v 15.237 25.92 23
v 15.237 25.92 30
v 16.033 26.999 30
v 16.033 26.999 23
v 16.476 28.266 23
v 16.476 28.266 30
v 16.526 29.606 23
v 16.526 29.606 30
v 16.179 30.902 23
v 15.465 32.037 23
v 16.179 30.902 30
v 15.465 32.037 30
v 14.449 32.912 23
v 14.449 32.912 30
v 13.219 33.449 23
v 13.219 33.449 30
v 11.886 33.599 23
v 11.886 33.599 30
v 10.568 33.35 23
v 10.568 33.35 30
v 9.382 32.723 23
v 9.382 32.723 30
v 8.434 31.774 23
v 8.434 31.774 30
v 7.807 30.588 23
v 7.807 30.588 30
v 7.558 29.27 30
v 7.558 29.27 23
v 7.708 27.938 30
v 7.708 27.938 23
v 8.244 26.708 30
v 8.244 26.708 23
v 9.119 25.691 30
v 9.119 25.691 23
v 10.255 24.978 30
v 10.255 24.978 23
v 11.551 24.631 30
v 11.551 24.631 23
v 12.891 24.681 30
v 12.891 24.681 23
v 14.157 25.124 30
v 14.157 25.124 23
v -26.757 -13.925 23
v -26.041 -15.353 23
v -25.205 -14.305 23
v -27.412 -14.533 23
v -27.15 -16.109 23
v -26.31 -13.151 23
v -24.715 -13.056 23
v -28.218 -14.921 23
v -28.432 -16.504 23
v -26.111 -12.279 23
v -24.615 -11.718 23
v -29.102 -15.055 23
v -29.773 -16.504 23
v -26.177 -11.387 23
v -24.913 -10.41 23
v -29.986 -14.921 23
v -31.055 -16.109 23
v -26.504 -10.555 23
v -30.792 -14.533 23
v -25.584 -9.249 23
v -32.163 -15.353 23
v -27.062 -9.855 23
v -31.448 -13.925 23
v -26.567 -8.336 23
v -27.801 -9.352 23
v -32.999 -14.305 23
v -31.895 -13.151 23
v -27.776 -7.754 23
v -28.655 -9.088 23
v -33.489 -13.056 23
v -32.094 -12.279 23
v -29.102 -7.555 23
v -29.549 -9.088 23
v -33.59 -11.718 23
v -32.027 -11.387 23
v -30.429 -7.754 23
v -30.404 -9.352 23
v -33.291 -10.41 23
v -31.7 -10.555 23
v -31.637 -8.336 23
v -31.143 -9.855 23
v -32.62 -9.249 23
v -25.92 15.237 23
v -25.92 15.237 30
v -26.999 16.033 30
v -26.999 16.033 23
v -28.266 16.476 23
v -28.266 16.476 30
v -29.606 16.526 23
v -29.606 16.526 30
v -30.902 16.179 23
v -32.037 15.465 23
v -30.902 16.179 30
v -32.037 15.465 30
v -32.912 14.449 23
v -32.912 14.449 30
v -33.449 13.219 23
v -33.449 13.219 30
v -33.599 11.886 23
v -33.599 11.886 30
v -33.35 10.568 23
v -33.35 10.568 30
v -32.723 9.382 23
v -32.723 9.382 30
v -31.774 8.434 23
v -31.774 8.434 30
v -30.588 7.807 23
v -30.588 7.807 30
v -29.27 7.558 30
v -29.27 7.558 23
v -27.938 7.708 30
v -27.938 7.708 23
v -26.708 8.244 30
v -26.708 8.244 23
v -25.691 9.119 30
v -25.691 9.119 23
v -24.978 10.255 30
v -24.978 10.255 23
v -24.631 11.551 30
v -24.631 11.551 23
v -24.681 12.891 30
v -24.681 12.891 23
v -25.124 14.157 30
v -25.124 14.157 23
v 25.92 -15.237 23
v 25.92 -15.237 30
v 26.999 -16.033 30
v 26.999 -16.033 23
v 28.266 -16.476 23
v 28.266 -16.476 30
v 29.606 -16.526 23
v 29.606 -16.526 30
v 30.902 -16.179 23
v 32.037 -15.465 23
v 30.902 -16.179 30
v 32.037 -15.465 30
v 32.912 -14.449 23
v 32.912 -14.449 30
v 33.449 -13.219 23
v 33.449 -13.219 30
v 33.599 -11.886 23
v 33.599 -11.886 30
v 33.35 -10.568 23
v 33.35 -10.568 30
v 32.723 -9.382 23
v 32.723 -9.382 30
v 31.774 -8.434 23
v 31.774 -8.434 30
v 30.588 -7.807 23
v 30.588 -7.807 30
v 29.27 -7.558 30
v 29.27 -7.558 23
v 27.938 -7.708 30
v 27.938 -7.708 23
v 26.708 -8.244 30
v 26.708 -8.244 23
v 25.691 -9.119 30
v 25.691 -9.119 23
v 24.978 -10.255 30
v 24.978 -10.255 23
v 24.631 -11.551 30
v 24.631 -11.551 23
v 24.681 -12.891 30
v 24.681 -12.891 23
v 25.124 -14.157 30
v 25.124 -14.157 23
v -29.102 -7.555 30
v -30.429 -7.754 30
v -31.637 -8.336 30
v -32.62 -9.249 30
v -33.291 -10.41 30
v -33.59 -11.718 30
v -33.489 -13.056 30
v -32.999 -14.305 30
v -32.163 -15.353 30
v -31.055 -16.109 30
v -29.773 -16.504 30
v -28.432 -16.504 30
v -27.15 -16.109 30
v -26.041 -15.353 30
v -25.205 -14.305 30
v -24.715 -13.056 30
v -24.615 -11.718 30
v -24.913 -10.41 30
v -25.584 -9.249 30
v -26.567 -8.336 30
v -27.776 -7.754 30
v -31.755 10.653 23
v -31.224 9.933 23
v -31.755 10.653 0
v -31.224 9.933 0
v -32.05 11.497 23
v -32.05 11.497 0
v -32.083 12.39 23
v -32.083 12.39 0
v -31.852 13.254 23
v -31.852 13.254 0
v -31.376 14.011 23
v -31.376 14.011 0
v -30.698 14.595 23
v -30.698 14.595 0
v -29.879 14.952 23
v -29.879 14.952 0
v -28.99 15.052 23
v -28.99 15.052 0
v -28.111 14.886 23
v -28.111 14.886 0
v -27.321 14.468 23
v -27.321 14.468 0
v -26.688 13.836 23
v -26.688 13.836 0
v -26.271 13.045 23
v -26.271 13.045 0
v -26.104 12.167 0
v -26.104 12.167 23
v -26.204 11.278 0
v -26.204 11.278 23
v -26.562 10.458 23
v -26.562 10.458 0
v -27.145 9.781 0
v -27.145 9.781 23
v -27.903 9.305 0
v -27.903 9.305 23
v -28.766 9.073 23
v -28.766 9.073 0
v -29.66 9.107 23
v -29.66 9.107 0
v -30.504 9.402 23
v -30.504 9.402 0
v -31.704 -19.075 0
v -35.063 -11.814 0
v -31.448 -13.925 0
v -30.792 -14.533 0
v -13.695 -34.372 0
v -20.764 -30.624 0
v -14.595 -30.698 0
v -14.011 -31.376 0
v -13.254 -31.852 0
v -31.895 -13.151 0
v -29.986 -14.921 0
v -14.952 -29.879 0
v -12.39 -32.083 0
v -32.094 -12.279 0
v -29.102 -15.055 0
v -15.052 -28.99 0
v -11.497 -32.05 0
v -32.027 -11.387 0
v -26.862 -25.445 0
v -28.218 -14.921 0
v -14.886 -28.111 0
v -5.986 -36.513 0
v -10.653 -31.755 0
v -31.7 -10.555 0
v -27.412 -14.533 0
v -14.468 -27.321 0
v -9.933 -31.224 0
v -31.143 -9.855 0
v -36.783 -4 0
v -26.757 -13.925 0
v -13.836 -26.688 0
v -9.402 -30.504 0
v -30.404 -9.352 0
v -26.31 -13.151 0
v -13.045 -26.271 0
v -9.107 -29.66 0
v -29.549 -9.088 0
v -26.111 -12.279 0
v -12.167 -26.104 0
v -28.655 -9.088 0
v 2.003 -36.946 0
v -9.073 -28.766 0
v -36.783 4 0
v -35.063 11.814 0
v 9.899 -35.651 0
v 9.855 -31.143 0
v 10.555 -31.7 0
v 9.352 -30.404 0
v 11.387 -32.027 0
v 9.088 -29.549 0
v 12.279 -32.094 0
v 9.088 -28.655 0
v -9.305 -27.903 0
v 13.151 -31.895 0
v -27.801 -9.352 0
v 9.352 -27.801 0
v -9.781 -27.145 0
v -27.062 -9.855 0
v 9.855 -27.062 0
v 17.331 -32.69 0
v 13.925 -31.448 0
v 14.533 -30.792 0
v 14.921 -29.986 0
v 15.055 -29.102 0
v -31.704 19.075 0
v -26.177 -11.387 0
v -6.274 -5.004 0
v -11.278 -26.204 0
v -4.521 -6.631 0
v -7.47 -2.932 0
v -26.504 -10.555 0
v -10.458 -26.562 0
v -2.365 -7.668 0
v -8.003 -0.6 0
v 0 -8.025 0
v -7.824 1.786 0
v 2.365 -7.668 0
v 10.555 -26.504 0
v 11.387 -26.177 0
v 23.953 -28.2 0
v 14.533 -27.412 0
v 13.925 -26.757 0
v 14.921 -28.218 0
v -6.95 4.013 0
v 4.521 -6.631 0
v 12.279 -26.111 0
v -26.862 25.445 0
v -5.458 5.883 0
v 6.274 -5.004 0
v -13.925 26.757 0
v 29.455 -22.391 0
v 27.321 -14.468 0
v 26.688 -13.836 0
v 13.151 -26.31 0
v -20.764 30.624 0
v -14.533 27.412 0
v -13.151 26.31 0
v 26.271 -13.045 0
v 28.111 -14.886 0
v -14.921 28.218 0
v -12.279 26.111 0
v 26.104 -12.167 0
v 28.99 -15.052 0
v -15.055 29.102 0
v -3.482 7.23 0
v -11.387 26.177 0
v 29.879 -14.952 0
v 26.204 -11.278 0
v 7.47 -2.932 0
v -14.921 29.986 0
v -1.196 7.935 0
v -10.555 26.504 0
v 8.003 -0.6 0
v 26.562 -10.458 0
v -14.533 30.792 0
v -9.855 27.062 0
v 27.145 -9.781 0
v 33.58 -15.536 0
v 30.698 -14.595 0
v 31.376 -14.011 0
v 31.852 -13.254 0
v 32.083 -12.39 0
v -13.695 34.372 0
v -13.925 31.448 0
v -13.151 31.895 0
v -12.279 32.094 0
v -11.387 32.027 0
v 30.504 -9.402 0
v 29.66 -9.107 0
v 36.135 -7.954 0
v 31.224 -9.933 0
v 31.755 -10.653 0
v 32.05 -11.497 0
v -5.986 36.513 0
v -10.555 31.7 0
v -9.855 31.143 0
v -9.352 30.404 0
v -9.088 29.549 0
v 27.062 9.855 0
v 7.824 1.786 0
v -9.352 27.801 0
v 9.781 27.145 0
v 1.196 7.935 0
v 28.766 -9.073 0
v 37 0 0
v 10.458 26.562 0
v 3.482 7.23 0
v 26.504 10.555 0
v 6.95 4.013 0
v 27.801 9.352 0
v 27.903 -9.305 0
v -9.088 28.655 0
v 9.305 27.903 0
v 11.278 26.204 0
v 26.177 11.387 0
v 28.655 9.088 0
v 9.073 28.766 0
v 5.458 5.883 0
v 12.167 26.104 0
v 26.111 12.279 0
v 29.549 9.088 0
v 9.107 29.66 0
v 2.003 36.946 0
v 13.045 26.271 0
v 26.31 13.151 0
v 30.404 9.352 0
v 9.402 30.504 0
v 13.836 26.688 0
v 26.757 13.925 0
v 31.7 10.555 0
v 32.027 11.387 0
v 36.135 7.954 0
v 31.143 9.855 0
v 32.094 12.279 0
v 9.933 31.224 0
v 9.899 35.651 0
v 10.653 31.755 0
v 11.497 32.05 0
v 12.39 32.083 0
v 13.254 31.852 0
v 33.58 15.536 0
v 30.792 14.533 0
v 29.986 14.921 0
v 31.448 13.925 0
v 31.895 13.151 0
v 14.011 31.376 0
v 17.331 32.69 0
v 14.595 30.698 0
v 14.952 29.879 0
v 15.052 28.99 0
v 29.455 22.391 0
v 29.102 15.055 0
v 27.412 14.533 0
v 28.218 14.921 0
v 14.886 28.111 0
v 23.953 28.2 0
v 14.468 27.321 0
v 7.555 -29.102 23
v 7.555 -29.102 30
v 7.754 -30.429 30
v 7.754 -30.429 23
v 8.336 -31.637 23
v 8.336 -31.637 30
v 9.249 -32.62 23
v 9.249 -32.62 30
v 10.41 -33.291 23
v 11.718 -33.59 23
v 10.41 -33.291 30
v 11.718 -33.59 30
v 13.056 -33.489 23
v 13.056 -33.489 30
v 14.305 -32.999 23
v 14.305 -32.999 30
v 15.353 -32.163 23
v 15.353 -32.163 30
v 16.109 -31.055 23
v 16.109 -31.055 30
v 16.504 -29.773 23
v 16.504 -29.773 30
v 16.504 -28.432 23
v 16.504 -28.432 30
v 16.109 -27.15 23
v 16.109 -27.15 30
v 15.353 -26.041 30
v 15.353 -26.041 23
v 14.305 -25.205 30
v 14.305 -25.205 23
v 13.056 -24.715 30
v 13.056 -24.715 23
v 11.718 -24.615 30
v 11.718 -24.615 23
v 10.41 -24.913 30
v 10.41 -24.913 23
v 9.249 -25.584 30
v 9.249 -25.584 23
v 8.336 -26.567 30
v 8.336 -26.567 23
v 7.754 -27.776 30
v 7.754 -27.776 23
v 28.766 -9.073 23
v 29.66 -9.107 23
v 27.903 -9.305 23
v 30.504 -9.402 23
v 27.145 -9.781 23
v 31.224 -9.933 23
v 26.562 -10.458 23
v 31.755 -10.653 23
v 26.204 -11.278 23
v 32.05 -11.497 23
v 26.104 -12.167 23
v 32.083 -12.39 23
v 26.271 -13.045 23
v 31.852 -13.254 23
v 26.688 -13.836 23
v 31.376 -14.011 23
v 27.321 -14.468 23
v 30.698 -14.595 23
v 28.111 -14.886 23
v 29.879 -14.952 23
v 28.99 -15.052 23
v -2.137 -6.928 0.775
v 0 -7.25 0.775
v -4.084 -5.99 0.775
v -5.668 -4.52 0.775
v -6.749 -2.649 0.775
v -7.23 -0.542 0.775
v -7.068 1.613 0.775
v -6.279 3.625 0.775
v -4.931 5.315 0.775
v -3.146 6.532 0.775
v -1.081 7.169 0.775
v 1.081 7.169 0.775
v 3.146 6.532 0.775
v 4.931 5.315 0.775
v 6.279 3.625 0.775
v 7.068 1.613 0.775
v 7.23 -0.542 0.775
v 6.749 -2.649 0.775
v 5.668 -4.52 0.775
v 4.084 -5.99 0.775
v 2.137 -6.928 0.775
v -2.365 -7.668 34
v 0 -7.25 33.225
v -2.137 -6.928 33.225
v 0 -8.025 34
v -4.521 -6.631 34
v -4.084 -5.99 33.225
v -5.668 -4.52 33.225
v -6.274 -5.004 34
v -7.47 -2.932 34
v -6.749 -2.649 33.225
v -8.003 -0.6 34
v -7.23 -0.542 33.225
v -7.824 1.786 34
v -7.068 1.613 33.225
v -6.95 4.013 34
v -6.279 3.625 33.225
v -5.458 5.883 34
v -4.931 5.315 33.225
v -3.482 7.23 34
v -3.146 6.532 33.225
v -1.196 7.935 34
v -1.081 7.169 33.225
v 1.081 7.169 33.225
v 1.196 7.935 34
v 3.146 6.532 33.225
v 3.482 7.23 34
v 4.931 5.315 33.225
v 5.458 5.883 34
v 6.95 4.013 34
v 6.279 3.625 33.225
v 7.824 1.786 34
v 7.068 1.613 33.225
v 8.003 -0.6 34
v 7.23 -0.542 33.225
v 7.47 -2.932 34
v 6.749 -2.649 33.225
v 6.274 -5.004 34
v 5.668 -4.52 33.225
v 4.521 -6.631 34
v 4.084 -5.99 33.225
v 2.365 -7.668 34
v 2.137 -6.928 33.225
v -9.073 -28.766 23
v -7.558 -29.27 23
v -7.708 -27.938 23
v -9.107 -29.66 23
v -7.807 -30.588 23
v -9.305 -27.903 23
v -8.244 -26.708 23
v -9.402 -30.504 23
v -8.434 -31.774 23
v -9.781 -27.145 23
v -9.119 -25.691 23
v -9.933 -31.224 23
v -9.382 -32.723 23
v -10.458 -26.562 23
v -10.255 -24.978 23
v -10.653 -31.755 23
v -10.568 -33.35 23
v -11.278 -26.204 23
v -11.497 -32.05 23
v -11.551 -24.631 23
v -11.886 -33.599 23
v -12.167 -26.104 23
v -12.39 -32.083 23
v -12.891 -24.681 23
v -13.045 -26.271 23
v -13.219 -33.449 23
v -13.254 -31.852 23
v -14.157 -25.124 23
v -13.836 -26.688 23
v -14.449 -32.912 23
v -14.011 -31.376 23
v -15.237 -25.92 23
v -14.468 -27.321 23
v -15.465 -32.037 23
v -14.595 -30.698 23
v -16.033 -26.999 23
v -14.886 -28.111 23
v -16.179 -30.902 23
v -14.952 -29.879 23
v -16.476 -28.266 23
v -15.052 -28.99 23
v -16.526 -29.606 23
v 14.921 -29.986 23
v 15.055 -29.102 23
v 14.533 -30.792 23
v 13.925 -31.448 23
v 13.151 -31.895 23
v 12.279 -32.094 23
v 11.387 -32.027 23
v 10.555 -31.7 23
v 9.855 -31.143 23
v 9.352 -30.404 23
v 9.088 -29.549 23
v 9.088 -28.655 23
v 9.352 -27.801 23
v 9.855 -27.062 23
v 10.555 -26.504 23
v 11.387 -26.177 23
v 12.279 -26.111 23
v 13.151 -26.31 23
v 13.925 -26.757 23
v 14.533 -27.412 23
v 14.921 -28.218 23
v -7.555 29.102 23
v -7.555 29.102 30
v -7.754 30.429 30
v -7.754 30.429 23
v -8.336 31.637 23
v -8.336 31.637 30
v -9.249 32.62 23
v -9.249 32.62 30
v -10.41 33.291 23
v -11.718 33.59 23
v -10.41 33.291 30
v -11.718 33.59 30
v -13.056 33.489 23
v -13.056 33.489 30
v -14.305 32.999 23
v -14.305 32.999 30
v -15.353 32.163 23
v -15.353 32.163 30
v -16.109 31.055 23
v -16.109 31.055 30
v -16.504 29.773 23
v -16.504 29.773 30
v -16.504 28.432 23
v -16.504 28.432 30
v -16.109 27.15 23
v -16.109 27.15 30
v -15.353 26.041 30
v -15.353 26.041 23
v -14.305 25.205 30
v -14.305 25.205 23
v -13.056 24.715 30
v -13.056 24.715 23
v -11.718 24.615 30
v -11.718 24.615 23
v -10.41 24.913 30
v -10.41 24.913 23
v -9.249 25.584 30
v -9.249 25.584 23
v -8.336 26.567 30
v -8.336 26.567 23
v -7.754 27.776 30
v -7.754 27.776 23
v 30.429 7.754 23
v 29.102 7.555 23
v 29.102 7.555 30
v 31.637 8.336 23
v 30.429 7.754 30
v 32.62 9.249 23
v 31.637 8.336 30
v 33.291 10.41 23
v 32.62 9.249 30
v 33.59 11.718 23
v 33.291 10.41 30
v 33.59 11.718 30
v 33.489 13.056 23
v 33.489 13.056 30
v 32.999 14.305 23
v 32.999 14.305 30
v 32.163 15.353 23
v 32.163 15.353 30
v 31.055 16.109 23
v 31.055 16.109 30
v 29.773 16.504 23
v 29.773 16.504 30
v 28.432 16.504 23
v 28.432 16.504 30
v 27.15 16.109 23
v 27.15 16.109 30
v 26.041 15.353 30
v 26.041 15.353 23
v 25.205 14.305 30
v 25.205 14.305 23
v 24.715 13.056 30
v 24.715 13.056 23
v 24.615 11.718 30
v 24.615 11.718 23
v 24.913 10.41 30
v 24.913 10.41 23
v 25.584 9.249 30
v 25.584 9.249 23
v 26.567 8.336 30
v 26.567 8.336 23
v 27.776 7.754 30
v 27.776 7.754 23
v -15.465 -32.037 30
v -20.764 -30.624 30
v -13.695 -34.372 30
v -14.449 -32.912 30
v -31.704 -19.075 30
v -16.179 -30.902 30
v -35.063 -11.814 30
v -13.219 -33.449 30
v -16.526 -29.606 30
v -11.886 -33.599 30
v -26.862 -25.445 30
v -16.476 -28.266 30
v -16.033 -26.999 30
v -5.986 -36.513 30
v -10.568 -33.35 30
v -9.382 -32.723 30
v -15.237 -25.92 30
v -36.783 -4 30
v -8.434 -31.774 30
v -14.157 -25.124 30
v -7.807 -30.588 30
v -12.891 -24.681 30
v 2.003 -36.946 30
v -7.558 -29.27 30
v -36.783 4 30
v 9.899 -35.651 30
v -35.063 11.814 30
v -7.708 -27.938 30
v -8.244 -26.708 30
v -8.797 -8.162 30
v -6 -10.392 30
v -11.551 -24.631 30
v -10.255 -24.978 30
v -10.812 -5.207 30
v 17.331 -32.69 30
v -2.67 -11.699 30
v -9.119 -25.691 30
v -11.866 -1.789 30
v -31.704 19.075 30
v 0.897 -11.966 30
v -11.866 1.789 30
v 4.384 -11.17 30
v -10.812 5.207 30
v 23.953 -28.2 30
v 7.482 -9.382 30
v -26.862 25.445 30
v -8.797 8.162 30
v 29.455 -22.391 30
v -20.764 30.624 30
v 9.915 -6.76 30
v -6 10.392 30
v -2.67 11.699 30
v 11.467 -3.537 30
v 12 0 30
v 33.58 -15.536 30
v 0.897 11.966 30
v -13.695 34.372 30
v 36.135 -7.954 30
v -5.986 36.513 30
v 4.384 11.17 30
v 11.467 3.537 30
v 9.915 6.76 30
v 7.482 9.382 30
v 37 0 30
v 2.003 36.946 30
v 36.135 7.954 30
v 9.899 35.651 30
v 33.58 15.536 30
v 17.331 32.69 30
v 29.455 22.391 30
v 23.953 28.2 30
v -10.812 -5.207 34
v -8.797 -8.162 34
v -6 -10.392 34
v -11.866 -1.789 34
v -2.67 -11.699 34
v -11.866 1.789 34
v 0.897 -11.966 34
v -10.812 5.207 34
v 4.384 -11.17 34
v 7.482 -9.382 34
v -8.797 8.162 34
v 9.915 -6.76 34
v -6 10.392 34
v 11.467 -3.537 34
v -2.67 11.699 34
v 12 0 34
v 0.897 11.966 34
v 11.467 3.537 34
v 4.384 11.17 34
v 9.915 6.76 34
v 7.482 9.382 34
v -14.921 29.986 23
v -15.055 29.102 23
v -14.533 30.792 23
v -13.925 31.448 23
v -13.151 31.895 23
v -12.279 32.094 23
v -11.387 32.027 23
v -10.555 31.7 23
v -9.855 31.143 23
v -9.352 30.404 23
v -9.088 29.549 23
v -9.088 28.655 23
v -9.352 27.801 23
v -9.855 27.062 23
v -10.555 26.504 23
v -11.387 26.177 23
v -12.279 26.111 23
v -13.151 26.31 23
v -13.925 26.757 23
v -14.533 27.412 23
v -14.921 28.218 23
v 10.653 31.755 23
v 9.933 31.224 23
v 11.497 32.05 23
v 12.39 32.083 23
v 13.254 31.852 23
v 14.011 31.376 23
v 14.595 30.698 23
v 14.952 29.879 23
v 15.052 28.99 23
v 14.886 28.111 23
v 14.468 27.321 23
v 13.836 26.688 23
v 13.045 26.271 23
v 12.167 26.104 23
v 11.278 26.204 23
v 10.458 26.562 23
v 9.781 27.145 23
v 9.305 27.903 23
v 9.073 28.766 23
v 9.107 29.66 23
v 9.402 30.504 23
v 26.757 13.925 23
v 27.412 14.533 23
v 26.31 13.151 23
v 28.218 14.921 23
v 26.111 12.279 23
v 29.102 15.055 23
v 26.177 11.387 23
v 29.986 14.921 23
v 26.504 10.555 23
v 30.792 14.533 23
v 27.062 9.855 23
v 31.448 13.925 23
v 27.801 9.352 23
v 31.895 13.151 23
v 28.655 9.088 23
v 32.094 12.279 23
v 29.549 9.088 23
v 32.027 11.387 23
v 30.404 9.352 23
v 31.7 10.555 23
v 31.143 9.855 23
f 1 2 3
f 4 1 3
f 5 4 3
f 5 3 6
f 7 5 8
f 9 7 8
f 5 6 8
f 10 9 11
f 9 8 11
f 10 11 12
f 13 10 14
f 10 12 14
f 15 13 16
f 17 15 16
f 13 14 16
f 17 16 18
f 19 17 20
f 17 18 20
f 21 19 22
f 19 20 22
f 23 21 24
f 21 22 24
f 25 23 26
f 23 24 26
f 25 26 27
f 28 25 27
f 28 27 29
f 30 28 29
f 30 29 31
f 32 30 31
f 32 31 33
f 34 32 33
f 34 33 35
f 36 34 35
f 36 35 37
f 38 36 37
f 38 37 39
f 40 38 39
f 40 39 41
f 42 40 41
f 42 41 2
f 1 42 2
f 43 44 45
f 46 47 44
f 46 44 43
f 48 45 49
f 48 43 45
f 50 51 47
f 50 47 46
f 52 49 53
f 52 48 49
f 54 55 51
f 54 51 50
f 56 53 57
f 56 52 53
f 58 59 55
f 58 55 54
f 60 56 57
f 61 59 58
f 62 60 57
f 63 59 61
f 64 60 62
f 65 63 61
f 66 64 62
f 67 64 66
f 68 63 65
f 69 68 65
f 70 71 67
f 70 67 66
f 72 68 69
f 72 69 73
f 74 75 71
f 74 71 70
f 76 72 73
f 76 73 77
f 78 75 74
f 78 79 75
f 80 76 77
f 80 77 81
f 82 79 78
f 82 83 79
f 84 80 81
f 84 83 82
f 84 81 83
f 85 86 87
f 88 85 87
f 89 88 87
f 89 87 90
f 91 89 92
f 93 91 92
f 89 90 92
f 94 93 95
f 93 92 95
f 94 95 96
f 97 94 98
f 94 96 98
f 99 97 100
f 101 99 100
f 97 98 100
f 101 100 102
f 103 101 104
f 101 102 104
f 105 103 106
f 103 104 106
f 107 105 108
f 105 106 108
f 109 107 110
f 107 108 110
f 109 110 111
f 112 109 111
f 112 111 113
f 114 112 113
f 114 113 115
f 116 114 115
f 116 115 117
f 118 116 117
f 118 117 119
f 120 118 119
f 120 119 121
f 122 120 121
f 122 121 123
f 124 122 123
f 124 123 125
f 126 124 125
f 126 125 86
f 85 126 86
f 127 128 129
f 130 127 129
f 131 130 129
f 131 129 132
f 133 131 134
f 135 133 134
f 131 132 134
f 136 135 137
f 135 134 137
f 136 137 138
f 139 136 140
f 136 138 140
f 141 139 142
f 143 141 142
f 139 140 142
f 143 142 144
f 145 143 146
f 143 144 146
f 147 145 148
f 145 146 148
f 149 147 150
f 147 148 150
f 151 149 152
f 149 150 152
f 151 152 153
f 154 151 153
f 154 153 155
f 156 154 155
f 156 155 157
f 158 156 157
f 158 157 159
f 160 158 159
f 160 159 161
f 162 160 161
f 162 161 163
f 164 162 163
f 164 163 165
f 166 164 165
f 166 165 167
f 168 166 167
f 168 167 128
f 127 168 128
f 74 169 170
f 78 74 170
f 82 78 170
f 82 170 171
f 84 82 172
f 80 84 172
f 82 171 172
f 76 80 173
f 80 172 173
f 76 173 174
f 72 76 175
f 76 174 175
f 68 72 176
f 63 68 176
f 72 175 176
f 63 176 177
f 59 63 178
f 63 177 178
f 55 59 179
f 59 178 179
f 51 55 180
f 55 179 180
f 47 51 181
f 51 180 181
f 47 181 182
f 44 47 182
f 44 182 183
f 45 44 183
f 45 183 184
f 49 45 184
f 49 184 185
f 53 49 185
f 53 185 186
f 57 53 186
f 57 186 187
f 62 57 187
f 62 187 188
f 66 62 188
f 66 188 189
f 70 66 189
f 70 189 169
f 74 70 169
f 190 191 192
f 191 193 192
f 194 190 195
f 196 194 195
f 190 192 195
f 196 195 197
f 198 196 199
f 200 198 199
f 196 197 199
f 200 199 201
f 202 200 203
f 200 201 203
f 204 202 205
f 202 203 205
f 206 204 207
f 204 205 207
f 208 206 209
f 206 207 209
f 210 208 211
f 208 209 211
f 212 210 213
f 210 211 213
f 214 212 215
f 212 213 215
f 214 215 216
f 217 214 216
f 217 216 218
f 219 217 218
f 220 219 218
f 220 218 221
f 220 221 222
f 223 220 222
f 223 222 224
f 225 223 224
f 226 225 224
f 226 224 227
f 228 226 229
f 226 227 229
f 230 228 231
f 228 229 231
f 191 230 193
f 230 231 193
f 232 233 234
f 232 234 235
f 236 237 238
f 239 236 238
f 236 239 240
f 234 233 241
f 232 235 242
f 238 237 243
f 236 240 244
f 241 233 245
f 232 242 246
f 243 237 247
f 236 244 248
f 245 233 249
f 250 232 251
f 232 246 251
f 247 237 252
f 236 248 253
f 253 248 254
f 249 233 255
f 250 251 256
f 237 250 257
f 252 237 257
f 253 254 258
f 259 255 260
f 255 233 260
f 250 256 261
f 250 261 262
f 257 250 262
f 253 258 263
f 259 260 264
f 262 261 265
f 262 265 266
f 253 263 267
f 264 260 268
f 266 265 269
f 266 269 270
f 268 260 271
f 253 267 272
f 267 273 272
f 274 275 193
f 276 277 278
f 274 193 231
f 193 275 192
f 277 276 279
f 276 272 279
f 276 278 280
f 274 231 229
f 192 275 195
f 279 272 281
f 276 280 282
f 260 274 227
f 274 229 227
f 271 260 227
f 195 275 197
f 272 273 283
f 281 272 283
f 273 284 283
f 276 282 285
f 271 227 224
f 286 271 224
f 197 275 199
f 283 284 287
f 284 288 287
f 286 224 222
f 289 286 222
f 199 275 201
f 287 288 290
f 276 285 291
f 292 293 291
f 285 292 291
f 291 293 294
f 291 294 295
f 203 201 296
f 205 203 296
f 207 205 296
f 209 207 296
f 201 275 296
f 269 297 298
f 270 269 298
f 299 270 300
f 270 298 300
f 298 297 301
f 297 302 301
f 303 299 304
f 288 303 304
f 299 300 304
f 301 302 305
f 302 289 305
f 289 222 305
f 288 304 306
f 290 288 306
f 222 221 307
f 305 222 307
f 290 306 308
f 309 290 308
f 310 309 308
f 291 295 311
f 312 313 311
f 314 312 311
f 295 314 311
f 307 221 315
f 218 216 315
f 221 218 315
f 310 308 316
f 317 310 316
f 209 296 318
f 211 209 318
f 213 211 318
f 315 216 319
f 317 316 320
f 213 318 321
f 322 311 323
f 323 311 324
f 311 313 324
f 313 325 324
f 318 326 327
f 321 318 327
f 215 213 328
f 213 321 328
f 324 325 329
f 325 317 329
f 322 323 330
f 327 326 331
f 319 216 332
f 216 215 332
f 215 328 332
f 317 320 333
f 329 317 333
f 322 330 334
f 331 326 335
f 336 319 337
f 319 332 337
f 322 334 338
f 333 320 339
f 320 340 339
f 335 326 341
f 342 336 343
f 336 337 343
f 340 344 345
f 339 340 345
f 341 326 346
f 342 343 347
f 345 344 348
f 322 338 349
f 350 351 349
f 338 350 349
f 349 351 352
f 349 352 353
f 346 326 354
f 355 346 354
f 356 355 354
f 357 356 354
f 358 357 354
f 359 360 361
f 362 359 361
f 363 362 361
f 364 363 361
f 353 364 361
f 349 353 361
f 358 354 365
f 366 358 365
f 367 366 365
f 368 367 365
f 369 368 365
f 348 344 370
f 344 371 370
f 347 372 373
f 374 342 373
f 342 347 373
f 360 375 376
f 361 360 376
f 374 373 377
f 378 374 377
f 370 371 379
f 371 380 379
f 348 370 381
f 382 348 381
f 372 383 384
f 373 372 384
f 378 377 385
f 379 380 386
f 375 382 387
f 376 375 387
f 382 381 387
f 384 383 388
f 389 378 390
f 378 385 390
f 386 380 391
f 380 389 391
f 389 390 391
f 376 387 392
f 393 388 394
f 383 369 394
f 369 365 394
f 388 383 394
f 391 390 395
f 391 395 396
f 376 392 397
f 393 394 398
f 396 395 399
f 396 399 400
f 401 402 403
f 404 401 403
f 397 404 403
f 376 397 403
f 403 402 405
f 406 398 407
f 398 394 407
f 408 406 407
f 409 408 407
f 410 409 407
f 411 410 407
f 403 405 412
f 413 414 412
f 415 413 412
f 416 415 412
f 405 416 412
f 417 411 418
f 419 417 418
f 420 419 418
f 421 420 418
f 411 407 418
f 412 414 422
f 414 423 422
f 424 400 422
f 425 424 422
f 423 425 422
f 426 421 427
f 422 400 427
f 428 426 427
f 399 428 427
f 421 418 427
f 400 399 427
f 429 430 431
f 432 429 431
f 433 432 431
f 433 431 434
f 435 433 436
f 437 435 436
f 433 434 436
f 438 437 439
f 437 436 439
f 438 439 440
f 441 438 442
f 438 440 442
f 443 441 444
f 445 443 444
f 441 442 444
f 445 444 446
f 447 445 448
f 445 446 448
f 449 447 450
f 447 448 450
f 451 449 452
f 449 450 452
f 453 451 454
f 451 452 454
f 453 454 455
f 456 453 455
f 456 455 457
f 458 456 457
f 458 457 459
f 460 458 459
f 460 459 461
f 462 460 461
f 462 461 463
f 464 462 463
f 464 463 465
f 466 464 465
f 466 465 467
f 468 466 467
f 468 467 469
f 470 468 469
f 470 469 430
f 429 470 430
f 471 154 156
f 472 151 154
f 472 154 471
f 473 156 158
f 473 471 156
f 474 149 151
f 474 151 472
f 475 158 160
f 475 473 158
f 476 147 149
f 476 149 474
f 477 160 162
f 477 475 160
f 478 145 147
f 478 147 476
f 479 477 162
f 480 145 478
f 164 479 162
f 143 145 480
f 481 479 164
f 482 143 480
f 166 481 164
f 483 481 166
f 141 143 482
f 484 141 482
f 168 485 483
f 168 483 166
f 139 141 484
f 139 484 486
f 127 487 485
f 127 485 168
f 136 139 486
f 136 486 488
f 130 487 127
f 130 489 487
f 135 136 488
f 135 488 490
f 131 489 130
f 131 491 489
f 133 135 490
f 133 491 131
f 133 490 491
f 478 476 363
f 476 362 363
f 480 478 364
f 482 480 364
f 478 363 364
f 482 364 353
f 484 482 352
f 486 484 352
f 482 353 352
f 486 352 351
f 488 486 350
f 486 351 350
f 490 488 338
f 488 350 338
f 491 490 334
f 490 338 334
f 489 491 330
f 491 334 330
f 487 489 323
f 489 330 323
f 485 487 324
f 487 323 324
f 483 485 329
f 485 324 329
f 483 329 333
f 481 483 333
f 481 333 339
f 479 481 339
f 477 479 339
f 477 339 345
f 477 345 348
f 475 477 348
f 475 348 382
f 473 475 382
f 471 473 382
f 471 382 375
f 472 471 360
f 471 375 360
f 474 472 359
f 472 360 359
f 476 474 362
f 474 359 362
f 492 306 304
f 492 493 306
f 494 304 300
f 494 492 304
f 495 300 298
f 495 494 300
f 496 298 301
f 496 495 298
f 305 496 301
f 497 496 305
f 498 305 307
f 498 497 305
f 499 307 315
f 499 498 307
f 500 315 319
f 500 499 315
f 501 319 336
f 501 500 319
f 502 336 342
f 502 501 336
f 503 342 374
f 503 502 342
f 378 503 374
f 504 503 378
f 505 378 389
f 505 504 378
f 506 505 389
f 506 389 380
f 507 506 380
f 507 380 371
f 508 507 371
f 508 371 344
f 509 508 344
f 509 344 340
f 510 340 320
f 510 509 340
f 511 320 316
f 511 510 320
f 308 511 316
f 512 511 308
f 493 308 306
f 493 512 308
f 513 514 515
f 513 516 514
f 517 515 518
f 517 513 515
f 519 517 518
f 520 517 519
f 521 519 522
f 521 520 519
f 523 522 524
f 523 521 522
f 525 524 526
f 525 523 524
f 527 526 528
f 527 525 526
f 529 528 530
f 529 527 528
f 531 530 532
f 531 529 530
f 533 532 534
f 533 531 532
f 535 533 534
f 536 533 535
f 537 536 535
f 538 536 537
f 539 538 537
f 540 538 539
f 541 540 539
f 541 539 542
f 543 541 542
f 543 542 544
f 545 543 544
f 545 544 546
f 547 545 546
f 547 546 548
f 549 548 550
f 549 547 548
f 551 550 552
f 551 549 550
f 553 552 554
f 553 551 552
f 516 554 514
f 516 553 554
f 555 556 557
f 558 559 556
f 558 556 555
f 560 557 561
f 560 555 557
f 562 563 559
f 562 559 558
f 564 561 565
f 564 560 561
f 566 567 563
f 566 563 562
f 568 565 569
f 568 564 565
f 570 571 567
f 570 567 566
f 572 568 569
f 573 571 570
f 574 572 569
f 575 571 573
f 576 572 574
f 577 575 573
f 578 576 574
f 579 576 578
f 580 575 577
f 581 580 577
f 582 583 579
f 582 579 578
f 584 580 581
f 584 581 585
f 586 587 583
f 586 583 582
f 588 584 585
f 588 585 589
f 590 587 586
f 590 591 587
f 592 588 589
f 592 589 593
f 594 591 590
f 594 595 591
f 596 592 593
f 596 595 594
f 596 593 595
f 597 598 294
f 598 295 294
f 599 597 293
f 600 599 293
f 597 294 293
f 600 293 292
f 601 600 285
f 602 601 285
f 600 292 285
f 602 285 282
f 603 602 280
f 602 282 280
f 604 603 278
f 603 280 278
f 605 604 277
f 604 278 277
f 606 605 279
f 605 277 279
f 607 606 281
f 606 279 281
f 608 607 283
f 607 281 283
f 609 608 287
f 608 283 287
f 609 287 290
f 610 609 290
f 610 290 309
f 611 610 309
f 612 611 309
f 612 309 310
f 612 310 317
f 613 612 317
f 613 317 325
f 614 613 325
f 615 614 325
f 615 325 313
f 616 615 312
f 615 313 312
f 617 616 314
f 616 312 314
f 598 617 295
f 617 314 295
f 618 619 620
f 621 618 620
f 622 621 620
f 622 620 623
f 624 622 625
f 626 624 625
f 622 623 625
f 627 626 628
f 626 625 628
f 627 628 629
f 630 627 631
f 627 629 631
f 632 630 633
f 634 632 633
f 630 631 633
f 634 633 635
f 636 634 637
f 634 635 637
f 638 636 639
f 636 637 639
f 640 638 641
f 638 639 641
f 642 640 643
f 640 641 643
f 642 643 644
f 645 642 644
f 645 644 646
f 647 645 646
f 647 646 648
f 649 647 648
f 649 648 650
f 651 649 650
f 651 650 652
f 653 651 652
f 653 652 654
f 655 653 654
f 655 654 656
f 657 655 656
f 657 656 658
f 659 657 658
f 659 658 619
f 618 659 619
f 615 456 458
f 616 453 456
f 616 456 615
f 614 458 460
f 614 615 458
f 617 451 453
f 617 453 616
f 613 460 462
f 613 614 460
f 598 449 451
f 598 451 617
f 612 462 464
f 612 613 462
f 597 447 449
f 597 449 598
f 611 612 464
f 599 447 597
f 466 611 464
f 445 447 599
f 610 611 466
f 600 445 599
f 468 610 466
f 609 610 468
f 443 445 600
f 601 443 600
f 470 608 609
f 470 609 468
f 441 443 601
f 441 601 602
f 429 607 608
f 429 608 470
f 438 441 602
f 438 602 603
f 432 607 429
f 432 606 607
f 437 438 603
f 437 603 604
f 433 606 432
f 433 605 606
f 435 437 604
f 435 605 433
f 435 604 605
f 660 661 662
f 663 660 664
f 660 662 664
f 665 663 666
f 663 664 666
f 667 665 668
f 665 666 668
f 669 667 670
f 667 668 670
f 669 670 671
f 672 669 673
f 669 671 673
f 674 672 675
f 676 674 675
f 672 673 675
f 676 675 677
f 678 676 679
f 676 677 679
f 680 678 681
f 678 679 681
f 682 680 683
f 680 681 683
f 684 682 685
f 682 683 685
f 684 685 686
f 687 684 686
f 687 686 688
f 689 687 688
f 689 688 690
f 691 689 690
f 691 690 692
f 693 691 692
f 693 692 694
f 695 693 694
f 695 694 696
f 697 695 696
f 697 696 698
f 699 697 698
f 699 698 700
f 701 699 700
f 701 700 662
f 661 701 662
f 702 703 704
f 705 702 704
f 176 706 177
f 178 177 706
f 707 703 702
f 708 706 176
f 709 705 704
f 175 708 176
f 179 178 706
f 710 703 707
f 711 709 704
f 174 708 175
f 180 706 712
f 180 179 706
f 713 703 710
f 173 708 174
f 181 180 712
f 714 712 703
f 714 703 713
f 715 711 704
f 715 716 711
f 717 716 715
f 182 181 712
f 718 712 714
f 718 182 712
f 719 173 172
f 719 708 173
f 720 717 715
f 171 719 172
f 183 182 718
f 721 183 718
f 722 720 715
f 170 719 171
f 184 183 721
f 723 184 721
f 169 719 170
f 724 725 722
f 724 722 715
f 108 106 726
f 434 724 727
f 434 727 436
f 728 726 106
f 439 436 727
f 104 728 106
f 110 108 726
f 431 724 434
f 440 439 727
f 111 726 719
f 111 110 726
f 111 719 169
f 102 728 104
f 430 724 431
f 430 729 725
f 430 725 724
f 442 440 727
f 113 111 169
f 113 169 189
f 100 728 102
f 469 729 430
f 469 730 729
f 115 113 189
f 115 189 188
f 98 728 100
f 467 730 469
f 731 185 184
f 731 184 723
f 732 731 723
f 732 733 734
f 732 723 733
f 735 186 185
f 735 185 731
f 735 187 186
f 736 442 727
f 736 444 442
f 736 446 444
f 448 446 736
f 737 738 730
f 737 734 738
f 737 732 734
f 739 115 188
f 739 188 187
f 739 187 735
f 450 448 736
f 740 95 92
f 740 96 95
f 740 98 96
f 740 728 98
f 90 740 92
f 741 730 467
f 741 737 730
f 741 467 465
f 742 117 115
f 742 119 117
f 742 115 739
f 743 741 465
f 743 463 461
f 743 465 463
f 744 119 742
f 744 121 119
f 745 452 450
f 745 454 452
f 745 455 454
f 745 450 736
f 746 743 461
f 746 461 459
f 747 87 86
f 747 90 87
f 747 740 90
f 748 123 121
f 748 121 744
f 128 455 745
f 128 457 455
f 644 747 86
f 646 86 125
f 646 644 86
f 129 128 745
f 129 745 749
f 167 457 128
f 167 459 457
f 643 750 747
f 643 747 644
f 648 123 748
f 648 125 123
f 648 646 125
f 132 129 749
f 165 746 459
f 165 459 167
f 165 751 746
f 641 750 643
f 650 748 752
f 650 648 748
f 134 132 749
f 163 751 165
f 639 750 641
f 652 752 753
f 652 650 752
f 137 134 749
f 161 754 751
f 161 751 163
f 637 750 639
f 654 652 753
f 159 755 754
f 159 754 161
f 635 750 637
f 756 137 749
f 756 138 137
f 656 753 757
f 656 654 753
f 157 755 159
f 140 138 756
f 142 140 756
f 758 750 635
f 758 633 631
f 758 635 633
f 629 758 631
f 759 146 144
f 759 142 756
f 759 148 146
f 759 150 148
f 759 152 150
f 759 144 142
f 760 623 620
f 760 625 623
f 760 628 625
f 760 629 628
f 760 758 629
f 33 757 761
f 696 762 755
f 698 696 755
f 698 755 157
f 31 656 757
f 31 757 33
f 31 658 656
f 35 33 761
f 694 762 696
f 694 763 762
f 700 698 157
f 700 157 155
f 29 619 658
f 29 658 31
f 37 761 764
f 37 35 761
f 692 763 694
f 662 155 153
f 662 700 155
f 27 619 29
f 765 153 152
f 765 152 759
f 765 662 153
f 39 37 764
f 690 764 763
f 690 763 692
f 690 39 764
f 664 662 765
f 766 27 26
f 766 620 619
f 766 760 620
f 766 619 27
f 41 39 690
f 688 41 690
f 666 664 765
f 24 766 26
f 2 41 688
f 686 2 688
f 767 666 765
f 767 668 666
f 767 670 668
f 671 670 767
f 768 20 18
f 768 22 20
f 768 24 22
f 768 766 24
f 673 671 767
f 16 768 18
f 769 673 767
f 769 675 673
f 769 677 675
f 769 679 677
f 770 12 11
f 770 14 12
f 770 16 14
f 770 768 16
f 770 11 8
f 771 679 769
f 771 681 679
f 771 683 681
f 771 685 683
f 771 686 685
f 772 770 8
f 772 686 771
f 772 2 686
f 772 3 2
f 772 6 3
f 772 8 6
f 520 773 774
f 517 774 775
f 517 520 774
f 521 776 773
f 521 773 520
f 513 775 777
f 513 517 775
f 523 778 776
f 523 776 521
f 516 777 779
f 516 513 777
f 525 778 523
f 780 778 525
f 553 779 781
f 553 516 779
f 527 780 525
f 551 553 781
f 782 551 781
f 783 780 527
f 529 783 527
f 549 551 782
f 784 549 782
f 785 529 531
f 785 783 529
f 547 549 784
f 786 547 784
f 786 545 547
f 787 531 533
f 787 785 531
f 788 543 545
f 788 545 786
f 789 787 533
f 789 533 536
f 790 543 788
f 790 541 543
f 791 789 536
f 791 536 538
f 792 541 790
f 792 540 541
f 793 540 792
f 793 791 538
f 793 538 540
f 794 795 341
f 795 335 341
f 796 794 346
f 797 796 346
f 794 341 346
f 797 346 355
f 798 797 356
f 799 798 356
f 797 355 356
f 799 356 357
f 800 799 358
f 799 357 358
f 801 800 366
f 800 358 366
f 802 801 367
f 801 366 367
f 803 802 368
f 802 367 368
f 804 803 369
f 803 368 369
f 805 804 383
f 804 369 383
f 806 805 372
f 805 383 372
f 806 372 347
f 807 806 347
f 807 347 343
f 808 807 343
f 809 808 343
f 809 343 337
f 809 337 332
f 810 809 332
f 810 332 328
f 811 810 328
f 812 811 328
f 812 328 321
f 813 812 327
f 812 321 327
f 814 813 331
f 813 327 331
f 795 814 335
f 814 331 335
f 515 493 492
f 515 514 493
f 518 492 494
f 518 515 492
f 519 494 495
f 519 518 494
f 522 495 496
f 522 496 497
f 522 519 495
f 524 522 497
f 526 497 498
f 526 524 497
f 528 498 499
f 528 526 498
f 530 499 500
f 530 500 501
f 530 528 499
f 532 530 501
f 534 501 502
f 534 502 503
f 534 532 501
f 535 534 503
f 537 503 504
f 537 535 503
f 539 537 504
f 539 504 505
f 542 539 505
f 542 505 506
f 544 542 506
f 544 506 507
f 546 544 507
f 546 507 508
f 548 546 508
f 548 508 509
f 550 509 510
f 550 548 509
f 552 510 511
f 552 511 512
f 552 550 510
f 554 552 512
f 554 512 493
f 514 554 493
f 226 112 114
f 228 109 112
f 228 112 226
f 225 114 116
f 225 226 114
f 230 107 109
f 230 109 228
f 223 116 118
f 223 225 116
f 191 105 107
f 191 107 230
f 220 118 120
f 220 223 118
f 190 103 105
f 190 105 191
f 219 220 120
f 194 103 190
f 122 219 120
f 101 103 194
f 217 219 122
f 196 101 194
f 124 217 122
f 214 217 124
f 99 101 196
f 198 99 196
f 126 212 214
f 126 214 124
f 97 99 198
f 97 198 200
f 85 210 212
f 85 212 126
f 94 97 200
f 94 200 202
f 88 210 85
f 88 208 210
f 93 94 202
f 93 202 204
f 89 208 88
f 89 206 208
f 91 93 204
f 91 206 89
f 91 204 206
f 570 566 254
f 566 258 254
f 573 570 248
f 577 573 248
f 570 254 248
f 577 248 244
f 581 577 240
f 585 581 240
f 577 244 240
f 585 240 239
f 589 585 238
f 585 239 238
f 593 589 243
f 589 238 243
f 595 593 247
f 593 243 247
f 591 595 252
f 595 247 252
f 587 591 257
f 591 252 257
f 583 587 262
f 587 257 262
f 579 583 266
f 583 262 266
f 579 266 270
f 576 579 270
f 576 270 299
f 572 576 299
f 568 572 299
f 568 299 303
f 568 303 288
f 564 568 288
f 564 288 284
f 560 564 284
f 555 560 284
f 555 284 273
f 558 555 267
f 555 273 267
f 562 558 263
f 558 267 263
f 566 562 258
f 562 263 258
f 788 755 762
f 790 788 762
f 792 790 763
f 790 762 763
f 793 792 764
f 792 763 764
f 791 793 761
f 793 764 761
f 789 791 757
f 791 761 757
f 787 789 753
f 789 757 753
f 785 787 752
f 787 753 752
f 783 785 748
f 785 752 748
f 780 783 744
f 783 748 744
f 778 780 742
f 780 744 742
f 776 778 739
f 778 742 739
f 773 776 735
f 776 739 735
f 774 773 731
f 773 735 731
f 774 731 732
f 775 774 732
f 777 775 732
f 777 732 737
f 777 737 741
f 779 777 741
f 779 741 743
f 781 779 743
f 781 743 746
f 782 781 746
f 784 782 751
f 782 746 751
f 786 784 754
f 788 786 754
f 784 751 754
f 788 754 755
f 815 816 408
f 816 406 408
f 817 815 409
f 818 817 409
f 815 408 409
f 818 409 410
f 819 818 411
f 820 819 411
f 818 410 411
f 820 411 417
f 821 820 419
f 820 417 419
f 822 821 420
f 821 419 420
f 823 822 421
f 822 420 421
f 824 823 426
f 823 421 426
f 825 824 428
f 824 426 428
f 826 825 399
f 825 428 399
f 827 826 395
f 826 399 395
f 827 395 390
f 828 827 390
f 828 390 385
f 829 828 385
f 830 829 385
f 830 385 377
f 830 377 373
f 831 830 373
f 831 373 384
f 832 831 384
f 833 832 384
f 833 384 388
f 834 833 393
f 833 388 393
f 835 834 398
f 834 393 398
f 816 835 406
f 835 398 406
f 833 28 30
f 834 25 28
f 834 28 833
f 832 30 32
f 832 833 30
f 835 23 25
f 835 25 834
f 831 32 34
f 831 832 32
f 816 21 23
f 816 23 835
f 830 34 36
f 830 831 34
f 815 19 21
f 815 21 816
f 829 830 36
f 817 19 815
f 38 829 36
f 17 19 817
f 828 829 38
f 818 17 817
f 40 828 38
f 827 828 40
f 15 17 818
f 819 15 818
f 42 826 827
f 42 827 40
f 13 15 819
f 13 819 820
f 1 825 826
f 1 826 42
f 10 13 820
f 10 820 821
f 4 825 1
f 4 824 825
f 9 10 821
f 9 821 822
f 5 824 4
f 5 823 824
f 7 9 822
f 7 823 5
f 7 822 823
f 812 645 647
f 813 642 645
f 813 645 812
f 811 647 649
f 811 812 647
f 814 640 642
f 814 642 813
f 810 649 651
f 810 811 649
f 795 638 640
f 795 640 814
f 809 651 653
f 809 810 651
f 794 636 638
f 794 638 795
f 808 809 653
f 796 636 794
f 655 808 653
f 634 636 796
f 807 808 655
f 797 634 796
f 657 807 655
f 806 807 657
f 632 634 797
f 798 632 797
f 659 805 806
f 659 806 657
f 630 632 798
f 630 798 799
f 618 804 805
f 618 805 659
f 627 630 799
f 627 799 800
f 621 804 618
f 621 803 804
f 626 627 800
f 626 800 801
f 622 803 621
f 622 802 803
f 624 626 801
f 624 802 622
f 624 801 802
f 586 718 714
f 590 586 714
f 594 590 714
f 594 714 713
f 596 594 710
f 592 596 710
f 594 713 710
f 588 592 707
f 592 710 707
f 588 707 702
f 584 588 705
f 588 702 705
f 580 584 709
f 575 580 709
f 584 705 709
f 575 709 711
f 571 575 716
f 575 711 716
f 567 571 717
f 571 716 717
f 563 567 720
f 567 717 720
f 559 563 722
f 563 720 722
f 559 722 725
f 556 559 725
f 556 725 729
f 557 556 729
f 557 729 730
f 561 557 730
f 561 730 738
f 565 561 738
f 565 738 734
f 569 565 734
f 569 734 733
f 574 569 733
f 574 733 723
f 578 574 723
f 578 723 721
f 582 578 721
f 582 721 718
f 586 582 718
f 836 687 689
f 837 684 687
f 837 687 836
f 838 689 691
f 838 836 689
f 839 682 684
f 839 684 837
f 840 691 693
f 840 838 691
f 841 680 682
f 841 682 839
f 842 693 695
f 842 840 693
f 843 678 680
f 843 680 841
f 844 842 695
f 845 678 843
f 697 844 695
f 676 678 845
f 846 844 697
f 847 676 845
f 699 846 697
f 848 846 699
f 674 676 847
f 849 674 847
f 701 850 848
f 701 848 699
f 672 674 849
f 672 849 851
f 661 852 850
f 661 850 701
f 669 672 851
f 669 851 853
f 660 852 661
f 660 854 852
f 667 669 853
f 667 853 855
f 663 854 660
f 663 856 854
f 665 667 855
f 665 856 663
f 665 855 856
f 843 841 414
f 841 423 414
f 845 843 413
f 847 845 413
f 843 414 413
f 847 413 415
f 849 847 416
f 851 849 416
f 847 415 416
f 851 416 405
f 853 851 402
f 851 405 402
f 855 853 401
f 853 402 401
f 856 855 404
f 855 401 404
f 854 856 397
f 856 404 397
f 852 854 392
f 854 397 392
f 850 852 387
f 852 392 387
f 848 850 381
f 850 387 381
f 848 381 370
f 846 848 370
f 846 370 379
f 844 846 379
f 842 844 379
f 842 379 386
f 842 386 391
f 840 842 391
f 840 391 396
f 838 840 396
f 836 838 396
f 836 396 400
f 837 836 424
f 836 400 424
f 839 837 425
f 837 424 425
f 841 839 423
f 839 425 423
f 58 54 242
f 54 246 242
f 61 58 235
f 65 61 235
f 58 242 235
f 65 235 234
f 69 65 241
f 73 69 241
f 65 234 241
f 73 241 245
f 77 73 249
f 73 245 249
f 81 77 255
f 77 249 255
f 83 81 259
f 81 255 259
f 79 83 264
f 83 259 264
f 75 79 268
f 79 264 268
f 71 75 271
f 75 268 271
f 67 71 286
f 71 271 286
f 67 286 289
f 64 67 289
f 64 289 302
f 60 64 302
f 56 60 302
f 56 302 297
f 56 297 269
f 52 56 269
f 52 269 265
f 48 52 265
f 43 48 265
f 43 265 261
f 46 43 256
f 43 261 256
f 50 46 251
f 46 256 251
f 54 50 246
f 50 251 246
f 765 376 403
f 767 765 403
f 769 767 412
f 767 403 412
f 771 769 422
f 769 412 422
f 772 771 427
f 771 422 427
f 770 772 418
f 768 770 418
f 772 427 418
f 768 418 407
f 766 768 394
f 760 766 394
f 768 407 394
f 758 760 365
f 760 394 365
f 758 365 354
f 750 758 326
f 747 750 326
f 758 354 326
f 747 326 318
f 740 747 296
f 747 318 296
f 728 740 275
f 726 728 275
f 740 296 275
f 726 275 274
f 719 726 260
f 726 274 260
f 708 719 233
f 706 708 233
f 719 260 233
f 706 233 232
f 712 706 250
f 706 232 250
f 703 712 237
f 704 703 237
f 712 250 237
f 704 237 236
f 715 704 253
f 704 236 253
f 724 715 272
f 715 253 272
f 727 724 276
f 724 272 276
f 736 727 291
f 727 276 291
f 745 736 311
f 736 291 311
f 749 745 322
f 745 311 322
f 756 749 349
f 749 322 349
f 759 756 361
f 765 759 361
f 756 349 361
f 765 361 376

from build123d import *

# Parameters (mm, degrees)
ESBO_O1_R                = 37
RESSALTO_EXTRUS_O1_DEPTH = 30
FURO1_D                  = 6
FURO1_CBORE_D            = 9
FURO1_CBORE_DEPTH        = 7
PADR_OCIRCULAR1_COUNT    = 8
ESBO_O4_R                = 12
RESSALTO_EXTRUS_O2_DEPTH = 4


with BuildPart() as part:
    # Esboço1 → Ressalto-extrusão1 (new body)
    with BuildSketch(Plane.XY):
        Circle(ESBO_O1_R)
    extrude(amount=RESSALTO_EXTRUS_O1_DEPTH)

    # Furo1 (through all)
    with Locations(Plane(origin=(-12.05452812, 29.102205274, 30), x_dir=(1, 0, 0), z_dir=(0, 0, 1))):
        with Locations((0, 0)):
            furo1 = CounterBoreHole(FURO1_D / 2, FURO1_CBORE_D / 2, FURO1_CBORE_DEPTH)

    # PadrãoCircular1: Furo1 ×8 about axis
    padr_ocircular1_axis = Axis((0, 0, 30), (0, 0, 1))
    for i in range(1, PADR_OCIRCULAR1_COUNT):
        add(furo1.rotate(padr_ocircular1_axis, i * 360 / PADR_OCIRCULAR1_COUNT), mode=Mode.SUBTRACT)

    # Esboço4 → Ressalto-extrusão2 (add)
    with BuildSketch(Plane.XY.offset(30)):
        Circle(ESBO_O4_R)
    extrude(amount=RESSALTO_EXTRUS_O2_DEPTH)

    # Esboço7 → Furo roscado de M16x1.51 (revolve, cut)
    with BuildSketch(Plane(origin=(0, 0, 34), x_dir=(0, -1, 0), z_dir=(1, 0, 0))):
        Polygon((0, 0), (0, 34), (8.025, 34), (7.25, 33.225), (7.25, 0.775), (8.025, 0), align=None)
    revolve(axis=Axis((0, 0, 40.35), (0, 0, -1)), mode=Mode.SUBTRACT)


solid = part.part
